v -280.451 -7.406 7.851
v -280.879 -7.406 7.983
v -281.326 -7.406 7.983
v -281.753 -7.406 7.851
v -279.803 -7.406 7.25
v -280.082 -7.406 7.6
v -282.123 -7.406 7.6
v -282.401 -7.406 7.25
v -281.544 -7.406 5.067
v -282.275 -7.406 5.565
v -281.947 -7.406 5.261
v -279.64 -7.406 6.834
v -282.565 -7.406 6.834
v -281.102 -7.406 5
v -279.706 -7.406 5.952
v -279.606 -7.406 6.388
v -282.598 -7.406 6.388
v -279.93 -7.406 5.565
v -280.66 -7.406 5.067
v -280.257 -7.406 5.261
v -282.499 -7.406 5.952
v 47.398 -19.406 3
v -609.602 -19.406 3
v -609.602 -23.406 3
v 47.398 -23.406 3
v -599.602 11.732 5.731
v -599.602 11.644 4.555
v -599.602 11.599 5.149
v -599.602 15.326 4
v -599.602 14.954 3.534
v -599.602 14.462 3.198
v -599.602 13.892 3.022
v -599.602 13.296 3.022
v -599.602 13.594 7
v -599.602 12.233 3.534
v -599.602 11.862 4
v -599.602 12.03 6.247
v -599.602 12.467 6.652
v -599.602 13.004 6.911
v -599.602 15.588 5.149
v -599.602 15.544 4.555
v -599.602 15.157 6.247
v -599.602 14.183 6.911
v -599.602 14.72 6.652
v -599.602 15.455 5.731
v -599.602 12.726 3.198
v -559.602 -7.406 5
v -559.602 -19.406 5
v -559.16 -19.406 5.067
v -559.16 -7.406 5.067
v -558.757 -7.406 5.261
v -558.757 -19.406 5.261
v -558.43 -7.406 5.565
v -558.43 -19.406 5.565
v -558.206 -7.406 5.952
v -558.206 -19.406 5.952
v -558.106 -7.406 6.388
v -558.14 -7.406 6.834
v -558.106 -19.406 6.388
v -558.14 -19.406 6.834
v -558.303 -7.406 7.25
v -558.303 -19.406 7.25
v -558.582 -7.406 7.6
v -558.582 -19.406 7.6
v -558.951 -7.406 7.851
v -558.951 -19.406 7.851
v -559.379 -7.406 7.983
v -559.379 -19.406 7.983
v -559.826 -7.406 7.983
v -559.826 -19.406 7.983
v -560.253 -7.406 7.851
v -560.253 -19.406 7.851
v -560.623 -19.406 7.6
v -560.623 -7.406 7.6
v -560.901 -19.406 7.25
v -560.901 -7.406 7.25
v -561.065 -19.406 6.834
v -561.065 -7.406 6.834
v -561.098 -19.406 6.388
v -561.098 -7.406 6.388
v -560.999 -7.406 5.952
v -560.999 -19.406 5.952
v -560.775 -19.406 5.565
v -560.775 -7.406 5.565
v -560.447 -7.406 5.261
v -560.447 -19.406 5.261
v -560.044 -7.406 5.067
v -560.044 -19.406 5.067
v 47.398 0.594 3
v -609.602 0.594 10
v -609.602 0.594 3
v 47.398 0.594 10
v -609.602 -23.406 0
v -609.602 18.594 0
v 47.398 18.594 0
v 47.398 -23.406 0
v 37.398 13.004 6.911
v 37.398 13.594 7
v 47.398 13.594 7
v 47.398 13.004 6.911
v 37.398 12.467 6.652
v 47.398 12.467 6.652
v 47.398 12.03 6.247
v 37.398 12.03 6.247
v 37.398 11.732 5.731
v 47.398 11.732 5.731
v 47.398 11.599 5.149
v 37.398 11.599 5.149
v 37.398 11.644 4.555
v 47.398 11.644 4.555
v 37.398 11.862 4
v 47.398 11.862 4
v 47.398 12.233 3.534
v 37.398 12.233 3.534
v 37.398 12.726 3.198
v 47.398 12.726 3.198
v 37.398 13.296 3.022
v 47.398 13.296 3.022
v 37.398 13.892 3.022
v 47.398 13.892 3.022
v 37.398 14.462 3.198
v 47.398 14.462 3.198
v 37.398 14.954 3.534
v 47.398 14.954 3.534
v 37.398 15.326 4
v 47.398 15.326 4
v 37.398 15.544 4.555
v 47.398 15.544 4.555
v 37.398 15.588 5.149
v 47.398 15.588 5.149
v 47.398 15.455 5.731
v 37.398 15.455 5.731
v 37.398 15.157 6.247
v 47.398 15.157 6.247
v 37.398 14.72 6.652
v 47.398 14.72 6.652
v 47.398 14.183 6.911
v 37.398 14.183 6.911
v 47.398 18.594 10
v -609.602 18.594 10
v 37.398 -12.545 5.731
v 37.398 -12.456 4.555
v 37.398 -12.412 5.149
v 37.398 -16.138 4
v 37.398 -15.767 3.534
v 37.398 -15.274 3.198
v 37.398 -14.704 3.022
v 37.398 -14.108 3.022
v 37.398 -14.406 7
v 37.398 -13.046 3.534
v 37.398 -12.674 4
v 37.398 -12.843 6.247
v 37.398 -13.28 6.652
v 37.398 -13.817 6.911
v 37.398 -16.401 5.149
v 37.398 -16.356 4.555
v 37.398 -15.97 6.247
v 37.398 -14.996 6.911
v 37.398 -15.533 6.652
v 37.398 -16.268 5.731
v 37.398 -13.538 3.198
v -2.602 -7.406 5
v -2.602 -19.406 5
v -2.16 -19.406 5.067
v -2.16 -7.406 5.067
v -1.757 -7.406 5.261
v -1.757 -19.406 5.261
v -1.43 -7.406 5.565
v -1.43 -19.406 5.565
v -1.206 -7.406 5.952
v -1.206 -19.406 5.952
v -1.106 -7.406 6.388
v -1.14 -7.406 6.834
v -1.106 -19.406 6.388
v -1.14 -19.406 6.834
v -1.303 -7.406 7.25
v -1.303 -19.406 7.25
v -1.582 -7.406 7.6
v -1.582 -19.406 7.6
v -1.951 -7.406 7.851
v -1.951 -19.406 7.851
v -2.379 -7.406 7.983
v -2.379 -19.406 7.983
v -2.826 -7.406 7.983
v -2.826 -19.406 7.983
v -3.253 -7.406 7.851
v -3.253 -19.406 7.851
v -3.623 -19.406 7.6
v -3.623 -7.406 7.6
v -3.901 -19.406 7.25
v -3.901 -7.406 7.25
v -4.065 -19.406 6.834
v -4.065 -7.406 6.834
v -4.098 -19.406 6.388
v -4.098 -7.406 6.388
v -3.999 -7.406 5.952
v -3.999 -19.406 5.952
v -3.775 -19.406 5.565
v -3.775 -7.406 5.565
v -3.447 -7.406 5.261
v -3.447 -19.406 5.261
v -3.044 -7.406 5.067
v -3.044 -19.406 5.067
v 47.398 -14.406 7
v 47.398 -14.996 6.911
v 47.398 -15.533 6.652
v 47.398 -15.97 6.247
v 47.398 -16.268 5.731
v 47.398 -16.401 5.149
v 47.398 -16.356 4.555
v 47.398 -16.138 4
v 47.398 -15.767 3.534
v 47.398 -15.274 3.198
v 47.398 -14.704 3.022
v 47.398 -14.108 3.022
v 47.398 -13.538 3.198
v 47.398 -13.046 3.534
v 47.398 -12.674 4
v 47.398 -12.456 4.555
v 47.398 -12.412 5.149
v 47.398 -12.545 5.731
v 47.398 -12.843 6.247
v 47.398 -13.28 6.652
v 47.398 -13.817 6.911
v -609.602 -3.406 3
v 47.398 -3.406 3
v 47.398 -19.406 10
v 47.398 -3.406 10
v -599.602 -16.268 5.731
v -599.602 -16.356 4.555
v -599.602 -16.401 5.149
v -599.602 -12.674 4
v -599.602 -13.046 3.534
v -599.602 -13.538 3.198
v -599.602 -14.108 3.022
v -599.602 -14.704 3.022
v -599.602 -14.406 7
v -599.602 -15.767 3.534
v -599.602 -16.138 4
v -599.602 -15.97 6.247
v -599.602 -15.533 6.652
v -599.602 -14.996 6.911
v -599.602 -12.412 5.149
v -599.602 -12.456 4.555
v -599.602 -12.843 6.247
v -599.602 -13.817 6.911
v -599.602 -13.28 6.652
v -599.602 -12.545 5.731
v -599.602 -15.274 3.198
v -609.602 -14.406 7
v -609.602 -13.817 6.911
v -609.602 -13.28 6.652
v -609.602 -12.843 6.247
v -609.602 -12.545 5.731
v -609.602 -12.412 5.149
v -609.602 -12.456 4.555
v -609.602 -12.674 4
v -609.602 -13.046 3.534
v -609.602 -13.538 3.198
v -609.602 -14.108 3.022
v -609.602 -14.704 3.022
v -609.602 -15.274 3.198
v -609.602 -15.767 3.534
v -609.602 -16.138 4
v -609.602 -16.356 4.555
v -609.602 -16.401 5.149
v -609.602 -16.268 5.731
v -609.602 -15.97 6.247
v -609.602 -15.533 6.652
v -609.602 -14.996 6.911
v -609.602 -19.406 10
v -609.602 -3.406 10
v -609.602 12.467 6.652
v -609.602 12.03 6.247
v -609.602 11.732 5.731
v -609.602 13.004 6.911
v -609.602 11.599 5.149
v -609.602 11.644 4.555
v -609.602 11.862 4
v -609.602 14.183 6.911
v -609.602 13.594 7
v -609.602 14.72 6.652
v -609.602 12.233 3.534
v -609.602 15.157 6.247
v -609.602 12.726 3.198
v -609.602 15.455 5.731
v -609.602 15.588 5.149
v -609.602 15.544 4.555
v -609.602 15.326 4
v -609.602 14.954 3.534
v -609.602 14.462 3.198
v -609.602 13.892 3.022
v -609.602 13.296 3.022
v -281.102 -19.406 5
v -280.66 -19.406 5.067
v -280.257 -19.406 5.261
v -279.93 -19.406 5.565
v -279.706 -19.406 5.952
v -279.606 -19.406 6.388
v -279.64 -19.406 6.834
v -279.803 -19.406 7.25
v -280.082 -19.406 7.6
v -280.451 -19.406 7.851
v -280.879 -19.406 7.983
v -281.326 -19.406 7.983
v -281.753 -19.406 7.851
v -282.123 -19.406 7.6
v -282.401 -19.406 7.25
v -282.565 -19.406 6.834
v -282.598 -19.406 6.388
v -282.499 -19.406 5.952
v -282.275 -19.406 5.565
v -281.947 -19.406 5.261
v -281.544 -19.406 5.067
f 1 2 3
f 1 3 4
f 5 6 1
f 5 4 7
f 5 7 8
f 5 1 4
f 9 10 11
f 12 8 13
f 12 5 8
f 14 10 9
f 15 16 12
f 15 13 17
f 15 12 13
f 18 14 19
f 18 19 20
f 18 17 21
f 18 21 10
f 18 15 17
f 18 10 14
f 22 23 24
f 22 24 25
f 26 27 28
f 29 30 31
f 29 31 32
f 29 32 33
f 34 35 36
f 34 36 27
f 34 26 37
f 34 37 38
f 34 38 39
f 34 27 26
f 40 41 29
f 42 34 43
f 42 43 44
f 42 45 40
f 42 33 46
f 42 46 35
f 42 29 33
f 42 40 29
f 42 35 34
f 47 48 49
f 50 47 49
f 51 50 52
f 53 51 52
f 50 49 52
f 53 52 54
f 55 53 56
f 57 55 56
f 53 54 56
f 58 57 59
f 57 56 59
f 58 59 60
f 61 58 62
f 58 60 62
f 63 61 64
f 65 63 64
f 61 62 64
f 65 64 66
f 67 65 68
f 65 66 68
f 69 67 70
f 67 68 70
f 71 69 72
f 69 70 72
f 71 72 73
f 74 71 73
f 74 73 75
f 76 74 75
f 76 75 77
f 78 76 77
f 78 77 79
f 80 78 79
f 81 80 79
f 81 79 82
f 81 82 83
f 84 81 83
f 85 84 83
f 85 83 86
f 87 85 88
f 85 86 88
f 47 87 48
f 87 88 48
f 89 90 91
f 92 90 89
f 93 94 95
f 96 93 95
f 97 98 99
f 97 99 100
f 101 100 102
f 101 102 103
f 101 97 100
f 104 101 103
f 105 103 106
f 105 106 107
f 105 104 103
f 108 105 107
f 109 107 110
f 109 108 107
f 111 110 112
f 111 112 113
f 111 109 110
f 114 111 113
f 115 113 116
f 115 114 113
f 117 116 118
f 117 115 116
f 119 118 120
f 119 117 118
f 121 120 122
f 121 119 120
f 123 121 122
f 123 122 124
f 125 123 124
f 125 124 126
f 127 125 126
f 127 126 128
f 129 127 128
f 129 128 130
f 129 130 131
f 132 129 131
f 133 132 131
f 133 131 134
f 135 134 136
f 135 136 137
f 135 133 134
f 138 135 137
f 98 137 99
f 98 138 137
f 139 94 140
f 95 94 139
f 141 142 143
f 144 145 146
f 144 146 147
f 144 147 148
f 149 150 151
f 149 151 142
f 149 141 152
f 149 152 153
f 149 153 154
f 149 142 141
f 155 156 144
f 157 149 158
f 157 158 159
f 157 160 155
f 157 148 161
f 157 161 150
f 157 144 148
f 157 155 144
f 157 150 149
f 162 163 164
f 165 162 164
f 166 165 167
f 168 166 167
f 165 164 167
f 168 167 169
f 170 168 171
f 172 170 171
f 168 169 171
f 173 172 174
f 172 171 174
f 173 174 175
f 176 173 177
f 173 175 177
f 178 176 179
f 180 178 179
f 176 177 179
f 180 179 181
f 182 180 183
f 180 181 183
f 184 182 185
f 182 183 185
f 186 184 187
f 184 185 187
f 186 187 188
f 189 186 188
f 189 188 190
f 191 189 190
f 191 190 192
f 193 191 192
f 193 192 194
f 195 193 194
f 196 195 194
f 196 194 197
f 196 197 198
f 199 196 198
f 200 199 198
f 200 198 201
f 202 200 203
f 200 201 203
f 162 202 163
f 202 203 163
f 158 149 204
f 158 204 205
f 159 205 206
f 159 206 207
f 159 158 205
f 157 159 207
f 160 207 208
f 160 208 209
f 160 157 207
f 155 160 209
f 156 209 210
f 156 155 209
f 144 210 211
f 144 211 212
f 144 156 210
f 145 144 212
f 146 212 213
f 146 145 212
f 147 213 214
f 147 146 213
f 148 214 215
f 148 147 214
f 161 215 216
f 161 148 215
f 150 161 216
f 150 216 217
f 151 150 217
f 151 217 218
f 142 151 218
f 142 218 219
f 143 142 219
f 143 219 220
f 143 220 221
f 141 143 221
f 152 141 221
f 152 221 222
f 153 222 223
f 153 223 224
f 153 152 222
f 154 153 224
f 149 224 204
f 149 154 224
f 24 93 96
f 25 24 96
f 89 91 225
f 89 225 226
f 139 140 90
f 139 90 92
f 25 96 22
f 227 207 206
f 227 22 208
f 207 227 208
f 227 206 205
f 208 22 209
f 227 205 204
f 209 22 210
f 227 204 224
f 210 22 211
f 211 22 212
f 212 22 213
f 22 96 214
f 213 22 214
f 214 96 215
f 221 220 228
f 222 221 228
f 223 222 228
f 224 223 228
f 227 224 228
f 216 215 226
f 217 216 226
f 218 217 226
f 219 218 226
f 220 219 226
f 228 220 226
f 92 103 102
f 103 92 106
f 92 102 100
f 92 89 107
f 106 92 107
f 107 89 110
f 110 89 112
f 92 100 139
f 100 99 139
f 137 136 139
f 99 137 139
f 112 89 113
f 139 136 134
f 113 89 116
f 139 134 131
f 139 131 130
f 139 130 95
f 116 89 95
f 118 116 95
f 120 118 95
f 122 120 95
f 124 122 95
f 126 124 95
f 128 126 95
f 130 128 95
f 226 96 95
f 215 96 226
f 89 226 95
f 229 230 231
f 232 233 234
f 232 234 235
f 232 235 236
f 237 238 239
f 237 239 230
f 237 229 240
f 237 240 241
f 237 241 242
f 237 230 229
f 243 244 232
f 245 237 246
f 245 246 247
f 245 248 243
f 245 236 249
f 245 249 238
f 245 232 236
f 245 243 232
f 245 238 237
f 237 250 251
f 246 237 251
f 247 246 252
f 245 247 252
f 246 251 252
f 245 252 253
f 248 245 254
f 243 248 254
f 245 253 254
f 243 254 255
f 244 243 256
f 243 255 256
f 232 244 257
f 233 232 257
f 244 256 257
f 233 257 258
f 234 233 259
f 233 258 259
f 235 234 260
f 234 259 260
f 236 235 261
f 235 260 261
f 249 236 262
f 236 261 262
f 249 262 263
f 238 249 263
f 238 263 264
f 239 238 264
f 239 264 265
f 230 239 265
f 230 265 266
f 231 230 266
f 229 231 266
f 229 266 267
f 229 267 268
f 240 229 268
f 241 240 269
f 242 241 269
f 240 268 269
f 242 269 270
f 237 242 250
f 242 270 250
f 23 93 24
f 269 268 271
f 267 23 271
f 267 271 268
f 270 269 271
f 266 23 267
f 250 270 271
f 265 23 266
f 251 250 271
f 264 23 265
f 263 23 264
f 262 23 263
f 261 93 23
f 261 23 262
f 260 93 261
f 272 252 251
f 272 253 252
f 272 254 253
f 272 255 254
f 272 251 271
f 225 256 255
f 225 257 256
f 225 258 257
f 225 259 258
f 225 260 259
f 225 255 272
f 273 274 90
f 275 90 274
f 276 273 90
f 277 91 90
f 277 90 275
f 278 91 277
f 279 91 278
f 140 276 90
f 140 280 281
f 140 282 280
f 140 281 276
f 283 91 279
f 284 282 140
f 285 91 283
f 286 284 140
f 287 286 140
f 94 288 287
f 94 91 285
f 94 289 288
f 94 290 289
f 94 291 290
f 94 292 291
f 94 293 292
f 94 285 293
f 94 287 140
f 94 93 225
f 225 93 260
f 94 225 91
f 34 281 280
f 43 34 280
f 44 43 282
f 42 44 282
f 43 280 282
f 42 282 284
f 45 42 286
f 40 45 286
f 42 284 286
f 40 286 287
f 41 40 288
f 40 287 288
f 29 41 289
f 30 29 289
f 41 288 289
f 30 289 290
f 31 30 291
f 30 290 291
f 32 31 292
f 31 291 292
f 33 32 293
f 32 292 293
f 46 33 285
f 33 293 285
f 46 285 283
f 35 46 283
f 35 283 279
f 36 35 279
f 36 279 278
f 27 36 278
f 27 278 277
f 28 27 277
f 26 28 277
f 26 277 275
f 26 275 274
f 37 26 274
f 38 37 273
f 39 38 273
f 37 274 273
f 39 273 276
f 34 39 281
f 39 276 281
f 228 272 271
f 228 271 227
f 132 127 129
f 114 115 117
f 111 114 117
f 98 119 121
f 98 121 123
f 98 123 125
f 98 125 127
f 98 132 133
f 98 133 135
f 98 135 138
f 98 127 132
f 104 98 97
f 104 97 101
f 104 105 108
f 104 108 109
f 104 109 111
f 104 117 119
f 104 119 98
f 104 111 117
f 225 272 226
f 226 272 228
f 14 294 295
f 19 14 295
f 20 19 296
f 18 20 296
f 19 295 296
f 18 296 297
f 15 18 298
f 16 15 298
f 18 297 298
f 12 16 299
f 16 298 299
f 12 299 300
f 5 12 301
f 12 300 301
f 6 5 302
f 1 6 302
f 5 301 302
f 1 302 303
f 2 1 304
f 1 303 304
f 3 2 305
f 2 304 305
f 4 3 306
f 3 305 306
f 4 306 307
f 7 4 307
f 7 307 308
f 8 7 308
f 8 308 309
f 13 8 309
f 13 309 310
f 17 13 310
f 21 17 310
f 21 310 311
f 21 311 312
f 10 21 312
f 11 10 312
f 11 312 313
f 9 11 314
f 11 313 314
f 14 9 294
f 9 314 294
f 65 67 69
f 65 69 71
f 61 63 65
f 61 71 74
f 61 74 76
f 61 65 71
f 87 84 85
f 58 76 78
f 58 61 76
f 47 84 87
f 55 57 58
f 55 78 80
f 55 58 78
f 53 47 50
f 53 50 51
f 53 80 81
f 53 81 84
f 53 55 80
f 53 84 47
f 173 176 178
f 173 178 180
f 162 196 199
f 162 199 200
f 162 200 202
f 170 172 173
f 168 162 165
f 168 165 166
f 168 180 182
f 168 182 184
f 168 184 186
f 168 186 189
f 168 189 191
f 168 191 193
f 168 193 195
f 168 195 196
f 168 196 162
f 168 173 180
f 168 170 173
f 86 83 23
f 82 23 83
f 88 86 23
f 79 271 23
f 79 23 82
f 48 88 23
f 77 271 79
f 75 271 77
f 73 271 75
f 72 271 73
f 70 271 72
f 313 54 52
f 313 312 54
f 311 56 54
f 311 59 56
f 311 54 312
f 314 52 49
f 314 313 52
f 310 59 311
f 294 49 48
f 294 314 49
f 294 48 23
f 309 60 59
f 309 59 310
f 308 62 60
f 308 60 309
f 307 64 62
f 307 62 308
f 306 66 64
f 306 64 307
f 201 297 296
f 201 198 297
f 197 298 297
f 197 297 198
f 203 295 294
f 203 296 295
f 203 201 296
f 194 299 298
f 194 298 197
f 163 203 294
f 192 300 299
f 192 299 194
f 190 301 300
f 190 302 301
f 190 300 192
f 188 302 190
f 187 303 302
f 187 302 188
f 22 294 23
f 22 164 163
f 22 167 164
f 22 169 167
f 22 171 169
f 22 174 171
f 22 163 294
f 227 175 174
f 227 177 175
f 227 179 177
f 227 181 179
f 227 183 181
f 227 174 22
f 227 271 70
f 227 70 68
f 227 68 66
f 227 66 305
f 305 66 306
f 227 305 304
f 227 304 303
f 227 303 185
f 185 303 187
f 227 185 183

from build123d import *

# Parameters (mm, degrees)
SKETCH1_W           = 657
SKETCH1_H           = 42
BOSS_EXTRUDE1_DEPTH = 10
SKETCH2_W           = 657
SKETCH2_H           = 4
CUT_EXTRUDE1_DEPTH  = 7
SKETCH3_R           = 2
CUT_EXTRUDE2_DEPTH  = 10
CUT_EXTRUDE3_START  = -10
SKETCH4_R           = 2
CUT_EXTRUDE3_DEPTH  = 10
SKETCH5_R           = 1.5
CUT_EXTRUDE4_DEPTH  = 12


with BuildPart() as part:
    # Sketch1 → Boss-Extrude1 (new body)
    with BuildSketch(Plane.XY):
        with Locations((-281.102301223, -2.406262021)):
            Rectangle(SKETCH1_W, SKETCH1_H)
    extrude(amount=BOSS_EXTRUDE1_DEPTH)

    # Sketch2 → Cut-Extrude1 (cut)
    with BuildSketch(Plane.XY.offset(10)):
        with Locations((-281.102301223, -21.406262021)):
            Rectangle(SKETCH2_W, SKETCH2_H)
        with Locations((-281.102301223, -1.406262021)):
            Rectangle(SKETCH2_W, SKETCH2_H)
    extrude(amount=-CUT_EXTRUDE1_DEPTH, mode=Mode.SUBTRACT)

    # Sketch3 → Cut-Extrude2 (cut)
    with BuildSketch(Plane.ZY.offset(609.602301223)):
        with Locations((5, 13.593737979)):
            Circle(SKETCH3_R)
        with Locations((5, -14.406262021)):
            Circle(SKETCH3_R)
    extrude(amount=-CUT_EXTRUDE2_DEPTH, mode=Mode.SUBTRACT)

    # Sketch4 → Cut-Extrude3 (cut)
    with BuildSketch(Plane(origin=(47.397698777, 0, 0), x_dir=(0, 0, -1), z_dir=(1, 0, 0)).offset(CUT_EXTRUDE3_START)):
        with Locations(Location((-5, 13.593737979, 0), (0, 0, 180))):
            Circle(SKETCH4_R)
        with Locations(Location((-5, -14.406262021, 0), (0, 0, 180))):
            Circle(SKETCH4_R)
    extrude(amount=CUT_EXTRUDE3_DEPTH, mode=Mode.SUBTRACT)

    # Sketch5 → Cut-Extrude4 (cut)
    with BuildSketch(Plane(origin=(0, -19.406262021, 0), x_dir=(-1, 0, 0), z_dir=(0, -1, 0))):
        with Locations(Location((559.602301223, -6.5, 0), (0, 0, 90))):
            Circle(SKETCH5_R)
        with Locations(Location((281.102301223, -6.5, 0), (0, 0, 90))):
            Circle(SKETCH5_R)
        with Locations(Location((2.602301223, -6.5, 0), (0, 0, 90))):
            Circle(SKETCH5_R)
    extrude(amount=-CUT_EXTRUDE4_DEPTH, mode=Mode.SUBTRACT)


solid = part.part
